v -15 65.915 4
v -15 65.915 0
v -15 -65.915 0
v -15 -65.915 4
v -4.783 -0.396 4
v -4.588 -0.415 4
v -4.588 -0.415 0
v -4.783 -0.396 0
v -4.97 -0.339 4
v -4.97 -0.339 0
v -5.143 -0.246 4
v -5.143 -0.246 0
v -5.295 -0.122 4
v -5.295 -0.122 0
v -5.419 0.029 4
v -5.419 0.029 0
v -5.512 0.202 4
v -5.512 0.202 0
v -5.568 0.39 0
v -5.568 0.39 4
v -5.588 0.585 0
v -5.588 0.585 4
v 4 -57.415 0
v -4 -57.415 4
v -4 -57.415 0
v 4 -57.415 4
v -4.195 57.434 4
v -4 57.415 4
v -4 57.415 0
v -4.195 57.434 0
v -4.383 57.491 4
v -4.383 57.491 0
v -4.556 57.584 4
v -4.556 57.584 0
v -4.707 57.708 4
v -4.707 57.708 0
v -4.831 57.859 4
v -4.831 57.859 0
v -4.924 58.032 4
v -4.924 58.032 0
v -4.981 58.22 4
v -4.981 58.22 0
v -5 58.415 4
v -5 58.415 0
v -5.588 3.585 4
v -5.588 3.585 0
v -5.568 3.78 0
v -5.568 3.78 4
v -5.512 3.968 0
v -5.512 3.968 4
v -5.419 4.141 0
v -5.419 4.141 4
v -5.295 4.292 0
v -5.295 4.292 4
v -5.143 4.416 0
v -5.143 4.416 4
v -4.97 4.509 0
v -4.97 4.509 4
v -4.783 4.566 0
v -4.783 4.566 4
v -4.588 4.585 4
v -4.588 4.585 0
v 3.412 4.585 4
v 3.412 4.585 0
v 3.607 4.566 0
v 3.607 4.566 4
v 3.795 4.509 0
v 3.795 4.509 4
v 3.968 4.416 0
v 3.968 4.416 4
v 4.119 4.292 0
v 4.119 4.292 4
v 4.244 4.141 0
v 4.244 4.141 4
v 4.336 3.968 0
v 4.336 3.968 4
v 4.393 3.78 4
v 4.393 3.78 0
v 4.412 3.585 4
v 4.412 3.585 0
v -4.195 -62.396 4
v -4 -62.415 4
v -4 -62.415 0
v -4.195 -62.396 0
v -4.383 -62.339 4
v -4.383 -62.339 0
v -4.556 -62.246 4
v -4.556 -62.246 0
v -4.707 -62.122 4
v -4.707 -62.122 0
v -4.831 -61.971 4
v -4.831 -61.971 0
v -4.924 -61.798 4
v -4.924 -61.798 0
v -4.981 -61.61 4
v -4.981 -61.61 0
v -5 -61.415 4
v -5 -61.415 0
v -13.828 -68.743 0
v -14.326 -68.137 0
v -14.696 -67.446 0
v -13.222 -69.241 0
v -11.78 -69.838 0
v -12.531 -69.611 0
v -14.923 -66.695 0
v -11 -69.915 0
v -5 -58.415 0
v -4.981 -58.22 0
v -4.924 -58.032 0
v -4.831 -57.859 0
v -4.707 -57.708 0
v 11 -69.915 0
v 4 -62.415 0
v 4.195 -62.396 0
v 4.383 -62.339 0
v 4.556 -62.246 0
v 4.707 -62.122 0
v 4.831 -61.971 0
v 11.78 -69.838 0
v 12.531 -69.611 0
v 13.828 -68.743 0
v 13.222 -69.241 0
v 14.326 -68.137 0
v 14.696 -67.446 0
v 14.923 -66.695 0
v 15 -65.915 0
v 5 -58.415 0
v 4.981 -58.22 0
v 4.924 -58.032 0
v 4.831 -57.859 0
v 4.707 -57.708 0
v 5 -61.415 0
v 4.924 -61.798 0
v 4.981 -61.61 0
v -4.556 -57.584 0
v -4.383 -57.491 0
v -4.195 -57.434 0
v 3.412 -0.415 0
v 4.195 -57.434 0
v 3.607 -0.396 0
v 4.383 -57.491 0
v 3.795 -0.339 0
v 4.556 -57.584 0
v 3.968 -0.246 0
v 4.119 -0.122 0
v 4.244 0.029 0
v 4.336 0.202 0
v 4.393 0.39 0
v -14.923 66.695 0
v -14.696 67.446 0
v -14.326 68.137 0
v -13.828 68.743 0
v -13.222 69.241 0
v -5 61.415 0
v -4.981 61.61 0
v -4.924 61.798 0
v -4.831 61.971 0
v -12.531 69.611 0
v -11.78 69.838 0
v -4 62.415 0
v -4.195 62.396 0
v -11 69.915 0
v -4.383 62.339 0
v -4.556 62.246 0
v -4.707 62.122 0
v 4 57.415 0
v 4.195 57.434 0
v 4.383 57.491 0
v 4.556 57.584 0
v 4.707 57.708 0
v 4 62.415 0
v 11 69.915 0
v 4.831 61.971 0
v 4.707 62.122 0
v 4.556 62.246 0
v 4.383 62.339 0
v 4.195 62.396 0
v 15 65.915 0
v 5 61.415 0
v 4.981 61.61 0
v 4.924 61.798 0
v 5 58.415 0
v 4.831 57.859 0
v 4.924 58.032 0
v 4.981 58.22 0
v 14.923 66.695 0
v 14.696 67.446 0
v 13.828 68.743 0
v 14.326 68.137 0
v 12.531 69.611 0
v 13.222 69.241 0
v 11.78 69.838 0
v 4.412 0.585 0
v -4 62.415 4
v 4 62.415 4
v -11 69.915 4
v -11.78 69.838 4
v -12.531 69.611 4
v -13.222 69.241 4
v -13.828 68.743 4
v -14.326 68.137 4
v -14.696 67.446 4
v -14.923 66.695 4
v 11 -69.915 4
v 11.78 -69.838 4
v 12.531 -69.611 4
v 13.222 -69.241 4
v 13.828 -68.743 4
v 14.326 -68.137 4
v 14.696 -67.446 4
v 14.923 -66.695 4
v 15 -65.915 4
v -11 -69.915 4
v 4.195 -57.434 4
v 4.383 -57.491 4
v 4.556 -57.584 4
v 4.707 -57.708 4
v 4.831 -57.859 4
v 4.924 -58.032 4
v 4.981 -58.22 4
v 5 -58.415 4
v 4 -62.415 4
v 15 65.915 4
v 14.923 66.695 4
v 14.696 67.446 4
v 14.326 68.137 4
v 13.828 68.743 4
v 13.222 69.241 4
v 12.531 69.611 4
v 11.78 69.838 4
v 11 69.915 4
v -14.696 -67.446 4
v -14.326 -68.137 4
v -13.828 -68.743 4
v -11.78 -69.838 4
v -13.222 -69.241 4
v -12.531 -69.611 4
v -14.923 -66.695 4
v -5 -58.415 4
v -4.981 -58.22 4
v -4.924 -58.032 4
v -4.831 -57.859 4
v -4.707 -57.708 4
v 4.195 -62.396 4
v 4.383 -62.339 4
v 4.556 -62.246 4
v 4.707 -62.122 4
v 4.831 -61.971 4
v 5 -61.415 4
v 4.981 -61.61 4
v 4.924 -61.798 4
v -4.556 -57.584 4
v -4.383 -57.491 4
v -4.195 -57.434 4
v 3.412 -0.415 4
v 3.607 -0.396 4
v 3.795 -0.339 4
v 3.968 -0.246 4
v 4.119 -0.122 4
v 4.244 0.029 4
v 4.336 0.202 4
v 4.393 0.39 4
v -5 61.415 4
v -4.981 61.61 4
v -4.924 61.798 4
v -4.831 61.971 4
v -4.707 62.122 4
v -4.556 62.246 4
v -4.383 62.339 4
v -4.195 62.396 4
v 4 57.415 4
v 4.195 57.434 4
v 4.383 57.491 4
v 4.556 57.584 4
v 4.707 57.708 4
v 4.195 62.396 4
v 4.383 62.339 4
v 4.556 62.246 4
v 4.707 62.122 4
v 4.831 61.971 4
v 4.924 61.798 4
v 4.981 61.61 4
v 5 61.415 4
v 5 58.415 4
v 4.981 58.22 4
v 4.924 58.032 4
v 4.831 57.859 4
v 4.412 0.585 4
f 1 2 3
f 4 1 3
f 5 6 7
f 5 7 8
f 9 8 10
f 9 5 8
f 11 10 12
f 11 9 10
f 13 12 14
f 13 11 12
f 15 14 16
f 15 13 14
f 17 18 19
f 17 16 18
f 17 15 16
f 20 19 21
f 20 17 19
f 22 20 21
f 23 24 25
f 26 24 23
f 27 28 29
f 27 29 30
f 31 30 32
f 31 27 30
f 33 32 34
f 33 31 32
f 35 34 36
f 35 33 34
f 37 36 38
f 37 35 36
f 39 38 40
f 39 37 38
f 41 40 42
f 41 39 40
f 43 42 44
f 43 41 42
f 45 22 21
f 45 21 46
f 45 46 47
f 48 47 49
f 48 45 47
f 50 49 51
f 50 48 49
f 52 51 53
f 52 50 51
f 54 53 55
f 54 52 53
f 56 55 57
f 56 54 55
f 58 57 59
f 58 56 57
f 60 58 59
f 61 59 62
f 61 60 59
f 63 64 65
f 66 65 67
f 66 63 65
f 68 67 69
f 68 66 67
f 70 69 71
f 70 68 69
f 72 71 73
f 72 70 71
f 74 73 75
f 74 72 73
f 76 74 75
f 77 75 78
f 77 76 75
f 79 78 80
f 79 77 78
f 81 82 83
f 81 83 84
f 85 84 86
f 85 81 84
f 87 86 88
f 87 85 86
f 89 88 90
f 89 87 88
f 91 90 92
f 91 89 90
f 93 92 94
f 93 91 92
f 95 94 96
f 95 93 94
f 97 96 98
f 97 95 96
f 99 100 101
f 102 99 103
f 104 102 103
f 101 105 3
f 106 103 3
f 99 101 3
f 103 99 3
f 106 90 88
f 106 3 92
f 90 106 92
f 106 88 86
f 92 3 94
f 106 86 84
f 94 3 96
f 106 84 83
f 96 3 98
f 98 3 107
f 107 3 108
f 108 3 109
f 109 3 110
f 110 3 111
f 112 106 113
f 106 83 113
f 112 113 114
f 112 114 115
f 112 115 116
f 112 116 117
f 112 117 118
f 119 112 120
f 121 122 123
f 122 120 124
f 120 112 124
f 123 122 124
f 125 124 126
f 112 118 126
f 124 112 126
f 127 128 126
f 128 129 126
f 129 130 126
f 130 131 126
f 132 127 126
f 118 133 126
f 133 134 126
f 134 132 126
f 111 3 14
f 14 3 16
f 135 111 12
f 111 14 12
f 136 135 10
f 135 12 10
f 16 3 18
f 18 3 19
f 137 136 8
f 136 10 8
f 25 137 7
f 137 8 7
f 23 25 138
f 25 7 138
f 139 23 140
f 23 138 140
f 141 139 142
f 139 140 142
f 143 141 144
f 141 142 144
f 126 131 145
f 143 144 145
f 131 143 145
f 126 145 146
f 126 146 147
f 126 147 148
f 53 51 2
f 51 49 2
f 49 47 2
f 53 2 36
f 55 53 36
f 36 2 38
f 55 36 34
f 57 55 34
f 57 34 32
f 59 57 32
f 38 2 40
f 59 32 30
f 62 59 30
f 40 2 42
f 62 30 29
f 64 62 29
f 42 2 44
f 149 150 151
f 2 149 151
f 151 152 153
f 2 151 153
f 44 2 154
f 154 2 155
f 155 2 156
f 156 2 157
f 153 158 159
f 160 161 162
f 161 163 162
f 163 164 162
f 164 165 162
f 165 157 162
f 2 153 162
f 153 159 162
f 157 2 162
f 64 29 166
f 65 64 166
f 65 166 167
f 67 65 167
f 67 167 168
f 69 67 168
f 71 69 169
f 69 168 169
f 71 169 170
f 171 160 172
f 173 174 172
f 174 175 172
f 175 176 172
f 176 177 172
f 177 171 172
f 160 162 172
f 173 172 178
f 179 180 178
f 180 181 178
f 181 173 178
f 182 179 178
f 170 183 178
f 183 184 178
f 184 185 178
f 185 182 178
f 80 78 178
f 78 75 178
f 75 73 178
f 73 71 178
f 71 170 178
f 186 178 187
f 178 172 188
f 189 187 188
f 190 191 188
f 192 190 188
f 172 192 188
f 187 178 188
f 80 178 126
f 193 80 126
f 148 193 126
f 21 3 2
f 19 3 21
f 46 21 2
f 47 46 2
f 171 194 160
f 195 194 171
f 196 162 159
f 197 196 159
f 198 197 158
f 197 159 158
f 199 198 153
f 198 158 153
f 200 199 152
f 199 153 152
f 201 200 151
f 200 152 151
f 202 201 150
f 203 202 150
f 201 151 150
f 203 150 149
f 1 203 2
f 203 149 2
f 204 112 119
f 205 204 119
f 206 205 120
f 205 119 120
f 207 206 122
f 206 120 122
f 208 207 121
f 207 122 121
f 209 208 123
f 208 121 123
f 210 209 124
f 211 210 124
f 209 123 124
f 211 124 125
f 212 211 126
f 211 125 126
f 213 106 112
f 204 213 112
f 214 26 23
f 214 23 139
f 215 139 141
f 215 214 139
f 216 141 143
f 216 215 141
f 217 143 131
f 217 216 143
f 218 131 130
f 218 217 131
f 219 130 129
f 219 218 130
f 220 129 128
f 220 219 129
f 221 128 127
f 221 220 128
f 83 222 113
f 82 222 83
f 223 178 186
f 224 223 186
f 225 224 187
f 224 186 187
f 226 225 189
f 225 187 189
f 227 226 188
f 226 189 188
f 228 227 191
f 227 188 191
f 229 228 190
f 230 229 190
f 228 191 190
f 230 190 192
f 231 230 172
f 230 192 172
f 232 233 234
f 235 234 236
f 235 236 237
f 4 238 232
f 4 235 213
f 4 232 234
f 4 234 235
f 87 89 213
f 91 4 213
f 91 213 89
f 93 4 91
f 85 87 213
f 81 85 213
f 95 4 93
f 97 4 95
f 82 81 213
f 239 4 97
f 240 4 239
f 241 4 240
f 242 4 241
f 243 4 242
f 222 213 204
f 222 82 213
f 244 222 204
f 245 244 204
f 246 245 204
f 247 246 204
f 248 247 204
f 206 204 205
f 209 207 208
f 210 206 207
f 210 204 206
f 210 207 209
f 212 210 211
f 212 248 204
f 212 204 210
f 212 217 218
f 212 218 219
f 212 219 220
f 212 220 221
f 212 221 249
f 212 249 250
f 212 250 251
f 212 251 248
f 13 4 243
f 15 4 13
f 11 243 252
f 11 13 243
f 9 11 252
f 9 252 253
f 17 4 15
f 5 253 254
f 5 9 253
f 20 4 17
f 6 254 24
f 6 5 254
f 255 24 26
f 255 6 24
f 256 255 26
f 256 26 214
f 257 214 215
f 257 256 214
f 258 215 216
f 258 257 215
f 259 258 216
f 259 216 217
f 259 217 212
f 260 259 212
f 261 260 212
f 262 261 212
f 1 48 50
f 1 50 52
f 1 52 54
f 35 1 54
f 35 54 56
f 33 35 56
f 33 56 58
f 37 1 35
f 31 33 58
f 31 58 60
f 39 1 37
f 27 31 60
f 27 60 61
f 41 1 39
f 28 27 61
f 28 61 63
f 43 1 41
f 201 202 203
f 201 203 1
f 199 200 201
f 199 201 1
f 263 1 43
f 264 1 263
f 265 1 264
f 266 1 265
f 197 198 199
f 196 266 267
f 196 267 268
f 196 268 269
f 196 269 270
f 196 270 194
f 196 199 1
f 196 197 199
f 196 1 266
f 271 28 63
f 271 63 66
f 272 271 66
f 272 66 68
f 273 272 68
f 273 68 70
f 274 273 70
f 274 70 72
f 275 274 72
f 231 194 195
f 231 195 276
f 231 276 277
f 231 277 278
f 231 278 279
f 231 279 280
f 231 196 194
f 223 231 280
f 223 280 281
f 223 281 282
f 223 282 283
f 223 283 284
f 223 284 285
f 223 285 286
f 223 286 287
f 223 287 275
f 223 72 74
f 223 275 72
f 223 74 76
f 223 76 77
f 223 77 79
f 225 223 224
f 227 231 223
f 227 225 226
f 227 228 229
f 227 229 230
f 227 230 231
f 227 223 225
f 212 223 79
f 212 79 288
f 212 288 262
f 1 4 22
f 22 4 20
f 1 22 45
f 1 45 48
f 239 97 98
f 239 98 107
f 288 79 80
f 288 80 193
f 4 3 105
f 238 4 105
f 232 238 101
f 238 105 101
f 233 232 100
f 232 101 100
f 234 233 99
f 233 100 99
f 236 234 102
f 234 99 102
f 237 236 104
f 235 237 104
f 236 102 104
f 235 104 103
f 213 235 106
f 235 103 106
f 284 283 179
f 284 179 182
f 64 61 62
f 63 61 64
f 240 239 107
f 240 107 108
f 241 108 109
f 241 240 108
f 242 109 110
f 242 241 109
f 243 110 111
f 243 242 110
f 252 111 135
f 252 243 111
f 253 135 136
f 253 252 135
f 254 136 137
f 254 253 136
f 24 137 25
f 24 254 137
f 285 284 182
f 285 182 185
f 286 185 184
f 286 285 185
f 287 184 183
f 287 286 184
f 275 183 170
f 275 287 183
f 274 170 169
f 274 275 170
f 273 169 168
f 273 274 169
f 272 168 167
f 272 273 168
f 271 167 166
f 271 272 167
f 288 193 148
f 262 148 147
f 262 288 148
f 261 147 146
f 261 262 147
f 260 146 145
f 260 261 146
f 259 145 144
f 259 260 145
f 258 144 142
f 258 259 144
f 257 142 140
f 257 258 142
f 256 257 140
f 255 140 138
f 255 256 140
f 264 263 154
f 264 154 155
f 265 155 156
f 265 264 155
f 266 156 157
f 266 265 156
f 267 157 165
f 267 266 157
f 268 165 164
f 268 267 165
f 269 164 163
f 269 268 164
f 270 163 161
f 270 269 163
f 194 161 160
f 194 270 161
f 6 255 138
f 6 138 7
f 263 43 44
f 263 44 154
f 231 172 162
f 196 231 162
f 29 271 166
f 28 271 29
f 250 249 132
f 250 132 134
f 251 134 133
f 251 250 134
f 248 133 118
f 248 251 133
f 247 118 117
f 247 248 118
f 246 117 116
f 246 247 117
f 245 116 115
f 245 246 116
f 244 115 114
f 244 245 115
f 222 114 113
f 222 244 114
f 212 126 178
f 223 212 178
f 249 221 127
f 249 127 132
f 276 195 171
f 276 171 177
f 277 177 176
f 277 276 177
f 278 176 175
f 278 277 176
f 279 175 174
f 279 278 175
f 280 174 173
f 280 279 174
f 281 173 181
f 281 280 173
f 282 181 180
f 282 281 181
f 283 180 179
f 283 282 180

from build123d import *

# Parameters (mm, degrees)
BOSS_EXTRU_1_DEPTH      = 4
ENL_V_MAT_EXTRU_1_DEPTH = 72.617785675


with BuildPart() as part:
    # Esquisse1 → Boss.-Extru.1 (new body)
    with BuildSketch(Plane.XY):
        with BuildLine():
            Line((-11, -69.915), (11, -69.915))
            ThreePointArc((11, -69.915), (13.828427125, -68.743427125), (15, -65.915))
            Line((15, -65.915), (15, 65.915))
            ThreePointArc((15, 65.915), (13.828427125, 68.743427125), (11, 69.915))
            Line((11, 69.915), (-11, 69.915))
            ThreePointArc((-11, 69.915), (-13.828427125, 68.743427125), (-15, 65.915))
            Line((-15, 65.915), (-15, -65.915))
            ThreePointArc((-15, -65.915), (-13.828427125, -68.743427125), (-11, -69.915))
        make_face()
    extrude(amount=BOSS_EXTRU_1_DEPTH)

    # Esquisse2 → Enlèv. mat.-Extru.1 (cut, through all)
    with BuildSketch(Plane.XY.offset(4)):
        with BuildLine():
            Line((-4, -57.415), (4, -57.415))
            ThreePointArc((4, -57.415), (4.707106781, -57.707893219), (5, -58.415))
            Line((5, -58.415), (5, -61.415))
            ThreePointArc((5, -61.415), (4.707106781, -62.122106781), (4, -62.415))
            Line((4, -62.415), (-4, -62.415))
            ThreePointArc((-4, -62.415), (-4.707106781, -62.122106781), (-5, -61.415))
            Line((-5, -61.415), (-5, -58.415))
            ThreePointArc((-5, -58.415), (-4.707106781, -57.707893219), (-4, -57.415))
        make_face()
        with BuildLine():
            Line((-4, 62.415), (4, 62.415))
            ThreePointArc((4, 62.415), (4.707106781, 62.122106781), (5, 61.415))
            Line((5, 61.415), (5, 58.415))
            ThreePointArc((5, 58.415), (4.707106781, 57.707893219), (4, 57.415))
            Line((4, 57.415), (-4, 57.415))
            ThreePointArc((-4, 57.415), (-4.707106781, 57.707893219), (-5, 58.415))
            Line((-5, 58.415), (-5, 61.415))
            ThreePointArc((-5, 61.415), (-4.707106781, 62.122106781), (-4, 62.415))
        make_face()
        with BuildLine():
            Line((-4.587622439, 4.585), (3.412377561, 4.585))
            ThreePointArc((3.412377561, 4.585), (4.119484342, 4.292106781), (4.412377561, 3.585))
            Line((4.412377561, 3.585), (4.412377561, 0.585))
            ThreePointArc((4.412377561, 0.585), (4.119484342, -0.122106781), (3.412377561, -0.415))
            Line((3.412377561, -0.415), (-4.587622439, -0.415))
            ThreePointArc((-4.587622439, -0.415), (-5.29472922, -0.122106781), (-5.587622439, 0.585))
            Line((-5.587622439, 0.585), (-5.587622439, 3.585))
            ThreePointArc((-5.587622439, 3.585), (-5.29472922, 4.292106781), (-4.587622439, 4.585))
        make_face()
    extrude(amount=-ENL_V_MAT_EXTRU_1_DEPTH, mode=Mode.SUBTRACT)


solid = part.part
